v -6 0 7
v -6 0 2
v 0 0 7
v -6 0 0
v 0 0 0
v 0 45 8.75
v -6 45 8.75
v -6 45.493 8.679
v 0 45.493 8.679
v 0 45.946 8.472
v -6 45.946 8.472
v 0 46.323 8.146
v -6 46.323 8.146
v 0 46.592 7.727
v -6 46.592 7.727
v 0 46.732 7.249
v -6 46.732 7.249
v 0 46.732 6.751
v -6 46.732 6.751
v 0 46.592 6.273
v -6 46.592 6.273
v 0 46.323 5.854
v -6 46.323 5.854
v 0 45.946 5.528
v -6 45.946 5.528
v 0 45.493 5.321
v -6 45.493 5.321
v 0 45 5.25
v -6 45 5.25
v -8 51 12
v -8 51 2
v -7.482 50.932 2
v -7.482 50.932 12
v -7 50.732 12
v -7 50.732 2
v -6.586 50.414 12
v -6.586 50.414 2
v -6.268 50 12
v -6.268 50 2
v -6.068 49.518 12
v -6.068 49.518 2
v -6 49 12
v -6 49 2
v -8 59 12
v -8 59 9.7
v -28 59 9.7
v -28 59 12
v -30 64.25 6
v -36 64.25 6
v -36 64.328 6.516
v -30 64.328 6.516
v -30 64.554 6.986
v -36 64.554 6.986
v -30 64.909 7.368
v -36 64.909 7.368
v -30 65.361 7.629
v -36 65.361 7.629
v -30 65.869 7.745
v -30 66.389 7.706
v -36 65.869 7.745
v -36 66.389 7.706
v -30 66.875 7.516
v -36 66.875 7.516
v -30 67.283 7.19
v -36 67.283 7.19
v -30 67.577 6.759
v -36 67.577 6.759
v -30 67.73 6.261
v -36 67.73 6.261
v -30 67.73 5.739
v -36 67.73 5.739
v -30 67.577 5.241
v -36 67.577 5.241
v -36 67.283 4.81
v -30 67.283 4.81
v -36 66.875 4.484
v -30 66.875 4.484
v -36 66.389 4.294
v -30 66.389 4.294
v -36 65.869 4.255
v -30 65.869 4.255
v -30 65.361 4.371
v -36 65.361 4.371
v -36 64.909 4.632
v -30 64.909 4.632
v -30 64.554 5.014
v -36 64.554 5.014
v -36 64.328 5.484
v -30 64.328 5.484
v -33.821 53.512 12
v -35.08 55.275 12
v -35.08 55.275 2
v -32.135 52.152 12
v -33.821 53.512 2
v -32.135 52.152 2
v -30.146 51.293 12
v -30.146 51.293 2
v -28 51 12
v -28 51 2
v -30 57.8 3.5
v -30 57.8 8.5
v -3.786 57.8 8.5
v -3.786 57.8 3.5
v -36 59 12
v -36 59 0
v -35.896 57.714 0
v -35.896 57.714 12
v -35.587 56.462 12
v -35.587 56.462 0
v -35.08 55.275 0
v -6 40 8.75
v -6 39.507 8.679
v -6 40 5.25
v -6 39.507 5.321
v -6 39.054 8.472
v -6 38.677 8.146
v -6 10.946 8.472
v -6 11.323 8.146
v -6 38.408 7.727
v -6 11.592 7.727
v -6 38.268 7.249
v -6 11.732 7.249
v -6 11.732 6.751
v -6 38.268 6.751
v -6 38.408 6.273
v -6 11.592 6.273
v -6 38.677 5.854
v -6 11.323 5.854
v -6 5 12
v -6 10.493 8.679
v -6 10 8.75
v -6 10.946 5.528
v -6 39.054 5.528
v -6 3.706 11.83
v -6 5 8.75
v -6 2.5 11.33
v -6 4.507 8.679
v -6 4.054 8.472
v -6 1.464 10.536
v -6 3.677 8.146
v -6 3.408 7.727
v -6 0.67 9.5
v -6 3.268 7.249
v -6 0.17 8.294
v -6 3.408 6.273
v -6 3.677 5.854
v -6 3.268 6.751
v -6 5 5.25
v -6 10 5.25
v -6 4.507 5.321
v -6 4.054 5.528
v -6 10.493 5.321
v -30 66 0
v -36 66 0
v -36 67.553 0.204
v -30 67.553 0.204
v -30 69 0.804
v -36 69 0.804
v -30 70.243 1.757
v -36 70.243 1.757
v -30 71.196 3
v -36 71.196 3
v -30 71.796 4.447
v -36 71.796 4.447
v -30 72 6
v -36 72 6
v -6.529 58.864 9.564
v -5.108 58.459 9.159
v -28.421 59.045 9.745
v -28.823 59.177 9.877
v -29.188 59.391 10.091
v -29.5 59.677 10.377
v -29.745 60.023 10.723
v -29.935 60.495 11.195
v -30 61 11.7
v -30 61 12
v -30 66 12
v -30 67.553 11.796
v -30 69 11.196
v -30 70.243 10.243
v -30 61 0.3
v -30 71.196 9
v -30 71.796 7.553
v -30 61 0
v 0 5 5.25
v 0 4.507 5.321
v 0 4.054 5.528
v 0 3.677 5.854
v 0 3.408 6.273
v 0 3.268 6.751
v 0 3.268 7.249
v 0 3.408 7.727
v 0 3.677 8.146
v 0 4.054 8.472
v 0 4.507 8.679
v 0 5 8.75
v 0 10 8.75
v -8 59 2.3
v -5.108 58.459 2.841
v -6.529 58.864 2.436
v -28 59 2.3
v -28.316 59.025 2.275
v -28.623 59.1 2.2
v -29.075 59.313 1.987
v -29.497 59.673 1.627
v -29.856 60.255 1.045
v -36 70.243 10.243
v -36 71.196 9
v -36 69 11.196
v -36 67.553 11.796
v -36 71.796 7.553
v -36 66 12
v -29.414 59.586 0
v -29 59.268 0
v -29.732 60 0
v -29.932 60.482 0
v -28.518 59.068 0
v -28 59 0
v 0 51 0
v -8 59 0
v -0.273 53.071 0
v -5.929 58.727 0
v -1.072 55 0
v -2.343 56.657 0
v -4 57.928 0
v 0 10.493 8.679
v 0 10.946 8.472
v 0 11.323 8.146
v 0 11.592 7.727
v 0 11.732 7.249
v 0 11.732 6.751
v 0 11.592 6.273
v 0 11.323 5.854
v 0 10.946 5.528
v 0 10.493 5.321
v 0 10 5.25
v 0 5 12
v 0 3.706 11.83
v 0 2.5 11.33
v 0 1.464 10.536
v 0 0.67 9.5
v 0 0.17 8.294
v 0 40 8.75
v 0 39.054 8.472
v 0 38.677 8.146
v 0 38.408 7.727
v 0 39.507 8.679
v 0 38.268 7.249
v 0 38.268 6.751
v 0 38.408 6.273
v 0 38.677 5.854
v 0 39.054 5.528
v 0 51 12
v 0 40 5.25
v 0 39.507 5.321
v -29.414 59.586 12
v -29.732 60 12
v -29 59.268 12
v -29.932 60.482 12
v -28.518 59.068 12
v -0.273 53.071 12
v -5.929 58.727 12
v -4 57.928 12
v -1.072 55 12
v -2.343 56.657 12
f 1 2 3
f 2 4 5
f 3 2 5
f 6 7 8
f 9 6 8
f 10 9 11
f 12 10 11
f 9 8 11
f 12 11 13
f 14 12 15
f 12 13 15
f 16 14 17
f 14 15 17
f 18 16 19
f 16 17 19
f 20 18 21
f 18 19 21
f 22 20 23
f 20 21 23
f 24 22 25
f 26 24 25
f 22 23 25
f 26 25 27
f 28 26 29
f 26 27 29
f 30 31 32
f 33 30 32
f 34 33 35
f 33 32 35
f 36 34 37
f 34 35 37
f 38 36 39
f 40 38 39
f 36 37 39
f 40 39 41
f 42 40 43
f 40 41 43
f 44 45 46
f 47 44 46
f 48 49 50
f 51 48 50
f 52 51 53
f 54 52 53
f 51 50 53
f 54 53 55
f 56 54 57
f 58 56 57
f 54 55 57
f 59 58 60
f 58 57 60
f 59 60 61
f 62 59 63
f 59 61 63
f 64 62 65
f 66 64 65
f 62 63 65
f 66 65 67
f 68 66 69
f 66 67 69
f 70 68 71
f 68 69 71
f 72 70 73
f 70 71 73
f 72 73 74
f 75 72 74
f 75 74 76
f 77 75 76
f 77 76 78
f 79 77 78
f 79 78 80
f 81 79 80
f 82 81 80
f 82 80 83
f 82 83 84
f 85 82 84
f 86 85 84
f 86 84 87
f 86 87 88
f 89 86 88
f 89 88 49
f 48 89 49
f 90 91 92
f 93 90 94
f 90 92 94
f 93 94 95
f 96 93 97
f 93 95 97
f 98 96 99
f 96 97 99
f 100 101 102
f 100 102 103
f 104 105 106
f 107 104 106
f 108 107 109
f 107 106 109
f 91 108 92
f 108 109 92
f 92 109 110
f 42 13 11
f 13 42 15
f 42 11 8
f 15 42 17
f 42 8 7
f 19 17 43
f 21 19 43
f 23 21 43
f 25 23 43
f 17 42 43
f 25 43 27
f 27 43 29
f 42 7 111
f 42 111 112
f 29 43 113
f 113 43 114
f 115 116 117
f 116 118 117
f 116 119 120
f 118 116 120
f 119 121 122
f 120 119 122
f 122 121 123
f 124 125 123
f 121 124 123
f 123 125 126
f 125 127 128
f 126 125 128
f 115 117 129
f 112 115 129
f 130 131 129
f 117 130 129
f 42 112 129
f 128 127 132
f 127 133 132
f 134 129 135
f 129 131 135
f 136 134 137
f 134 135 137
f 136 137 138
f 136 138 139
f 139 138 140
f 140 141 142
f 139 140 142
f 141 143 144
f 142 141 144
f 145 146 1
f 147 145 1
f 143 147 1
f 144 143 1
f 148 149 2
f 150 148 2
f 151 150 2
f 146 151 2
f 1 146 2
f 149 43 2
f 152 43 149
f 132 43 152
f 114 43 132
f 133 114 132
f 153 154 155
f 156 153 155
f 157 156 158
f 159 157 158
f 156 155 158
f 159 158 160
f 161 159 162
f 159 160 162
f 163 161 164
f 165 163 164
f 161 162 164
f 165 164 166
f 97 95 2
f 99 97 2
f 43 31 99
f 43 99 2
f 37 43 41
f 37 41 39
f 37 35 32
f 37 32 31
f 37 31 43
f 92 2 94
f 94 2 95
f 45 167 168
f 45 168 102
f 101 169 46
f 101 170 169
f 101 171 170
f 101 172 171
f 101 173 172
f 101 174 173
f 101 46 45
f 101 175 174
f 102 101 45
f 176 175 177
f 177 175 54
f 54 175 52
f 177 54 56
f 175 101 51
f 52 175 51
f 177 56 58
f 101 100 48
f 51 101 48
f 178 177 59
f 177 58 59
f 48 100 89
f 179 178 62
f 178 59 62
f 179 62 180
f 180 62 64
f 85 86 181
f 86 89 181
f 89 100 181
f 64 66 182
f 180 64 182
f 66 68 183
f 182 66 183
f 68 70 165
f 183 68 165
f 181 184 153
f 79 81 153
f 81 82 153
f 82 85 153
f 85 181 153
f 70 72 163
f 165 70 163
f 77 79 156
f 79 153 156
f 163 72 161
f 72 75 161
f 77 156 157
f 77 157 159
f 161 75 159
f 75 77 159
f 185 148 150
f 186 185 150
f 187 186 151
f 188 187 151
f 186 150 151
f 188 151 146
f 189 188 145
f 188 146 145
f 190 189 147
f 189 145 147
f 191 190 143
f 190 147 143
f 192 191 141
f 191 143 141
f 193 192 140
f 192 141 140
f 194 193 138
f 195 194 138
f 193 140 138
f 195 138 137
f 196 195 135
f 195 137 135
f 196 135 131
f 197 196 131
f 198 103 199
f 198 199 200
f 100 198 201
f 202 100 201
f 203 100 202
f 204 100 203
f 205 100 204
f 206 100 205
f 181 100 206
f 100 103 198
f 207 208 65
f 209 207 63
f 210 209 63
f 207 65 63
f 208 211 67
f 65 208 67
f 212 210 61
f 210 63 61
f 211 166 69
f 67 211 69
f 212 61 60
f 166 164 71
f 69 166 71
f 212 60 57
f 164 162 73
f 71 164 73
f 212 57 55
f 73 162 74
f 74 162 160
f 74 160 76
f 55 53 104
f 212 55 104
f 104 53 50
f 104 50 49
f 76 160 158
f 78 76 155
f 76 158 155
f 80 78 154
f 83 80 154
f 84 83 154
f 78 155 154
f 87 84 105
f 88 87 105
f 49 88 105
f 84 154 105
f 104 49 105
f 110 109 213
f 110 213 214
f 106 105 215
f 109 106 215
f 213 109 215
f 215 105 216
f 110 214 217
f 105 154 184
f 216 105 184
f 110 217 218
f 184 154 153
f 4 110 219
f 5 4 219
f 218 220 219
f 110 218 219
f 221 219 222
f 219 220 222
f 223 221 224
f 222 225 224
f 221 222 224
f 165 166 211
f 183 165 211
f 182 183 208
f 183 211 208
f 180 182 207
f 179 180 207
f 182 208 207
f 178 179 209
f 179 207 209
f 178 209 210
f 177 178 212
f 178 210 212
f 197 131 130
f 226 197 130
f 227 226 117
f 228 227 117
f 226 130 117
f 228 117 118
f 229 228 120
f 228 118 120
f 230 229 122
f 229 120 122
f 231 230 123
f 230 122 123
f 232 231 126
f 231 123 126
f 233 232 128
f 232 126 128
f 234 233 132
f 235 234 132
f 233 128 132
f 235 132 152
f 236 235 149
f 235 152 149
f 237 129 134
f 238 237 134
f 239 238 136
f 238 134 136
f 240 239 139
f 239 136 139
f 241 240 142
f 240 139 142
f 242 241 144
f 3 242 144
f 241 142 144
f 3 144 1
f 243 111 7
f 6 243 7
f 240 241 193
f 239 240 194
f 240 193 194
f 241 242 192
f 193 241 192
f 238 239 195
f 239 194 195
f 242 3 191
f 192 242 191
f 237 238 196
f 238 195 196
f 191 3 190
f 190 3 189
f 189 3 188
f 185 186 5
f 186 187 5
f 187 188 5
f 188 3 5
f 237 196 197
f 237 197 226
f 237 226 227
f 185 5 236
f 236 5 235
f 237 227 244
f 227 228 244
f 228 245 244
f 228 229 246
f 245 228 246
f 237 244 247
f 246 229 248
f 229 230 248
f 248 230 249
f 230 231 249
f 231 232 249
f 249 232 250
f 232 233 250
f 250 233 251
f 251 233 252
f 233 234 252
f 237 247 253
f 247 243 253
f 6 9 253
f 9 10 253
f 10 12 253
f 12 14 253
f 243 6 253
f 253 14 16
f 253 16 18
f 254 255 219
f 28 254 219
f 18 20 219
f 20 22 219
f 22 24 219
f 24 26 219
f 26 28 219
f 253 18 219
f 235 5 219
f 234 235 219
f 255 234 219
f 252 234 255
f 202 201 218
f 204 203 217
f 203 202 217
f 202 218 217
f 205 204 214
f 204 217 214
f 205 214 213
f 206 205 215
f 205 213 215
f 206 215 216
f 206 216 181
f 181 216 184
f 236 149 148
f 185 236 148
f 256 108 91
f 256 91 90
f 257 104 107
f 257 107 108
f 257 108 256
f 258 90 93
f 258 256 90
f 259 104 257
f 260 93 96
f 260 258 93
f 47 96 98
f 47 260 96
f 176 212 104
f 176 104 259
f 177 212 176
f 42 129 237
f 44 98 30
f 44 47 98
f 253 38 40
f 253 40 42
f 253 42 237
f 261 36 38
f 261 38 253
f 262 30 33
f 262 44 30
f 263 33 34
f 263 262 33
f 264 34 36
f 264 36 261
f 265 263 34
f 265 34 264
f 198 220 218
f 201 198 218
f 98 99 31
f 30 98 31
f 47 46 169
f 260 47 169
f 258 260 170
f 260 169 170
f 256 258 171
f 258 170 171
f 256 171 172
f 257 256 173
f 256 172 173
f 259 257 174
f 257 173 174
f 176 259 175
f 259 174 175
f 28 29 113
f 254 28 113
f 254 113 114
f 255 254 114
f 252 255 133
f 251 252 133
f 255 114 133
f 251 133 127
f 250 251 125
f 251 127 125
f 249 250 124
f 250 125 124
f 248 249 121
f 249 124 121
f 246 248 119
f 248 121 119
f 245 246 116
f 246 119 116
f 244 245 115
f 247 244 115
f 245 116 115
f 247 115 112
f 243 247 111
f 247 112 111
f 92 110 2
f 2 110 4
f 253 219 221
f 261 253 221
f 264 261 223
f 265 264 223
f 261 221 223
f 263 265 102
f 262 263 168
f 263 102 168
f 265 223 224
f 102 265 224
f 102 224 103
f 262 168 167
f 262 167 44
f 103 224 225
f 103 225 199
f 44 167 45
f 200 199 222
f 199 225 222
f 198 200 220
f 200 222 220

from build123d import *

# Parameters (mm, degrees)
F1_DEPTH = 12
F2_DEPTH = 2
F5_DEPTH = 6
F6_R     = 1.75
F7_DEPTH = 6
F9_DEPTH = 30.001


with BuildPart() as f1:
    # F0 (on Top) → F1 (new body)
    with BuildSketch(Plane.XY):
        with BuildLine():
            Line((-6, 0), (0, 0))
            Line((0, 0), (0, 51))
            ThreePointArc((0, 51), (-2.343146, 56.656854), (-8, 59))
            Line((-8, 59), (-28, 59))
            ThreePointArc((-28, 59), (-29.414214, 59.585786), (-30, 61))
            Line((-30, 61), (-30, 72))
            Line((-30, 72), (-36, 72))
            Line((-36, 72), (-36, 59))
            ThreePointArc((-36, 59), (-35.766593, 57.081659), (-35.079992, 55.275257))
            ThreePointArc((-35.079992, 55.275257), (-32.135339, 52.151718), (-28, 51))
            Line((-28, 51), (-8, 51))
            ThreePointArc((-8, 51), (-6.585786, 50.414214), (-6, 49))
            Line((-6, 49), (-6, 0))
        make_face()
    extrude(amount=F1_DEPTH)

    # F0 (on Top) → F2 (join)
    with BuildSketch(Plane.XY):
        with BuildLine():
            Line((-35.079992, 55.275257), (-6, 0))
            Line((-6, 0), (-6, 49))
            ThreePointArc((-6, 49), (-6.585786, 50.414214), (-8, 51))
            Line((-8, 51), (-28, 51))
            ThreePointArc((-28, 51), (-32.135339, 52.151718), (-35.079992, 55.275257))
        make_face()
    extrude(amount=F2_DEPTH)

    # F4 (on face) → F5 (cut, through all)
    with BuildSketch(Plane(origin=(-6, 0, 0), x_dir=(0, -1, 0), z_dir=(-1, 0, 0))):
        with BuildLine():
            ThreePointArc((-5, 12), (-1.464466, 10.535534), (0, 7))
            Line((0, 7), (0, 12))
            Line((0, 12), (-5, 12))
        make_face()
        with BuildLine():
            ThreePointArc((-5, 5.25), (-3.25, 7), (-5, 8.75))
            Line((-5, 8.75), (-10, 8.75))
            ThreePointArc((-10, 8.75), (-11.75, 7), (-10, 5.25))
            Line((-10, 5.25), (-5, 5.25))
        make_face()
        with BuildLine():
            ThreePointArc((-40, 5.25), (-38.25, 7), (-40, 8.75))
            Line((-40, 8.75), (-45, 8.75))
            ThreePointArc((-45, 8.75), (-46.75, 7), (-45, 5.25))
            Line((-45, 5.25), (-40, 5.25))
        make_face()
    extrude(amount=-F5_DEPTH, mode=Mode.SUBTRACT)

    # F6 (on face) → F7 (cut, through all)
    with BuildSketch(Plane(origin=(-36, 0, 0), x_dir=(0, -1, 0), z_dir=(-1, 0, 0))):
        with Locations((-66, 6)):
            Circle(F6_R)
        with BuildLine():
            ThreePointArc((-72, 6), (-70.242641, 10.242641), (-66, 12))
            Line((-66, 12), (-72, 12))
            Line((-72, 12), (-72, 6))
        make_face()
        with BuildLine():
            ThreePointArc((-66, 0), (-70.242641, 1.757359), (-72, 6))
            Line((-72, 6), (-72, 0))
            Line((-72, 0), (-66, 0))
        make_face()
    extrude(amount=-F7_DEPTH, mode=Mode.SUBTRACT)

    # F8 (on face) → F9 (cut, through all)
    with BuildSketch(Plane.YZ.offset(-30)):
        Polygon((66, 16.7), (57.8, 8.5), (57.8, 3.5), (66, -4.7), align=None)
    extrude(amount=F9_DEPTH, mode=Mode.SUBTRACT)


solid = f1.part
